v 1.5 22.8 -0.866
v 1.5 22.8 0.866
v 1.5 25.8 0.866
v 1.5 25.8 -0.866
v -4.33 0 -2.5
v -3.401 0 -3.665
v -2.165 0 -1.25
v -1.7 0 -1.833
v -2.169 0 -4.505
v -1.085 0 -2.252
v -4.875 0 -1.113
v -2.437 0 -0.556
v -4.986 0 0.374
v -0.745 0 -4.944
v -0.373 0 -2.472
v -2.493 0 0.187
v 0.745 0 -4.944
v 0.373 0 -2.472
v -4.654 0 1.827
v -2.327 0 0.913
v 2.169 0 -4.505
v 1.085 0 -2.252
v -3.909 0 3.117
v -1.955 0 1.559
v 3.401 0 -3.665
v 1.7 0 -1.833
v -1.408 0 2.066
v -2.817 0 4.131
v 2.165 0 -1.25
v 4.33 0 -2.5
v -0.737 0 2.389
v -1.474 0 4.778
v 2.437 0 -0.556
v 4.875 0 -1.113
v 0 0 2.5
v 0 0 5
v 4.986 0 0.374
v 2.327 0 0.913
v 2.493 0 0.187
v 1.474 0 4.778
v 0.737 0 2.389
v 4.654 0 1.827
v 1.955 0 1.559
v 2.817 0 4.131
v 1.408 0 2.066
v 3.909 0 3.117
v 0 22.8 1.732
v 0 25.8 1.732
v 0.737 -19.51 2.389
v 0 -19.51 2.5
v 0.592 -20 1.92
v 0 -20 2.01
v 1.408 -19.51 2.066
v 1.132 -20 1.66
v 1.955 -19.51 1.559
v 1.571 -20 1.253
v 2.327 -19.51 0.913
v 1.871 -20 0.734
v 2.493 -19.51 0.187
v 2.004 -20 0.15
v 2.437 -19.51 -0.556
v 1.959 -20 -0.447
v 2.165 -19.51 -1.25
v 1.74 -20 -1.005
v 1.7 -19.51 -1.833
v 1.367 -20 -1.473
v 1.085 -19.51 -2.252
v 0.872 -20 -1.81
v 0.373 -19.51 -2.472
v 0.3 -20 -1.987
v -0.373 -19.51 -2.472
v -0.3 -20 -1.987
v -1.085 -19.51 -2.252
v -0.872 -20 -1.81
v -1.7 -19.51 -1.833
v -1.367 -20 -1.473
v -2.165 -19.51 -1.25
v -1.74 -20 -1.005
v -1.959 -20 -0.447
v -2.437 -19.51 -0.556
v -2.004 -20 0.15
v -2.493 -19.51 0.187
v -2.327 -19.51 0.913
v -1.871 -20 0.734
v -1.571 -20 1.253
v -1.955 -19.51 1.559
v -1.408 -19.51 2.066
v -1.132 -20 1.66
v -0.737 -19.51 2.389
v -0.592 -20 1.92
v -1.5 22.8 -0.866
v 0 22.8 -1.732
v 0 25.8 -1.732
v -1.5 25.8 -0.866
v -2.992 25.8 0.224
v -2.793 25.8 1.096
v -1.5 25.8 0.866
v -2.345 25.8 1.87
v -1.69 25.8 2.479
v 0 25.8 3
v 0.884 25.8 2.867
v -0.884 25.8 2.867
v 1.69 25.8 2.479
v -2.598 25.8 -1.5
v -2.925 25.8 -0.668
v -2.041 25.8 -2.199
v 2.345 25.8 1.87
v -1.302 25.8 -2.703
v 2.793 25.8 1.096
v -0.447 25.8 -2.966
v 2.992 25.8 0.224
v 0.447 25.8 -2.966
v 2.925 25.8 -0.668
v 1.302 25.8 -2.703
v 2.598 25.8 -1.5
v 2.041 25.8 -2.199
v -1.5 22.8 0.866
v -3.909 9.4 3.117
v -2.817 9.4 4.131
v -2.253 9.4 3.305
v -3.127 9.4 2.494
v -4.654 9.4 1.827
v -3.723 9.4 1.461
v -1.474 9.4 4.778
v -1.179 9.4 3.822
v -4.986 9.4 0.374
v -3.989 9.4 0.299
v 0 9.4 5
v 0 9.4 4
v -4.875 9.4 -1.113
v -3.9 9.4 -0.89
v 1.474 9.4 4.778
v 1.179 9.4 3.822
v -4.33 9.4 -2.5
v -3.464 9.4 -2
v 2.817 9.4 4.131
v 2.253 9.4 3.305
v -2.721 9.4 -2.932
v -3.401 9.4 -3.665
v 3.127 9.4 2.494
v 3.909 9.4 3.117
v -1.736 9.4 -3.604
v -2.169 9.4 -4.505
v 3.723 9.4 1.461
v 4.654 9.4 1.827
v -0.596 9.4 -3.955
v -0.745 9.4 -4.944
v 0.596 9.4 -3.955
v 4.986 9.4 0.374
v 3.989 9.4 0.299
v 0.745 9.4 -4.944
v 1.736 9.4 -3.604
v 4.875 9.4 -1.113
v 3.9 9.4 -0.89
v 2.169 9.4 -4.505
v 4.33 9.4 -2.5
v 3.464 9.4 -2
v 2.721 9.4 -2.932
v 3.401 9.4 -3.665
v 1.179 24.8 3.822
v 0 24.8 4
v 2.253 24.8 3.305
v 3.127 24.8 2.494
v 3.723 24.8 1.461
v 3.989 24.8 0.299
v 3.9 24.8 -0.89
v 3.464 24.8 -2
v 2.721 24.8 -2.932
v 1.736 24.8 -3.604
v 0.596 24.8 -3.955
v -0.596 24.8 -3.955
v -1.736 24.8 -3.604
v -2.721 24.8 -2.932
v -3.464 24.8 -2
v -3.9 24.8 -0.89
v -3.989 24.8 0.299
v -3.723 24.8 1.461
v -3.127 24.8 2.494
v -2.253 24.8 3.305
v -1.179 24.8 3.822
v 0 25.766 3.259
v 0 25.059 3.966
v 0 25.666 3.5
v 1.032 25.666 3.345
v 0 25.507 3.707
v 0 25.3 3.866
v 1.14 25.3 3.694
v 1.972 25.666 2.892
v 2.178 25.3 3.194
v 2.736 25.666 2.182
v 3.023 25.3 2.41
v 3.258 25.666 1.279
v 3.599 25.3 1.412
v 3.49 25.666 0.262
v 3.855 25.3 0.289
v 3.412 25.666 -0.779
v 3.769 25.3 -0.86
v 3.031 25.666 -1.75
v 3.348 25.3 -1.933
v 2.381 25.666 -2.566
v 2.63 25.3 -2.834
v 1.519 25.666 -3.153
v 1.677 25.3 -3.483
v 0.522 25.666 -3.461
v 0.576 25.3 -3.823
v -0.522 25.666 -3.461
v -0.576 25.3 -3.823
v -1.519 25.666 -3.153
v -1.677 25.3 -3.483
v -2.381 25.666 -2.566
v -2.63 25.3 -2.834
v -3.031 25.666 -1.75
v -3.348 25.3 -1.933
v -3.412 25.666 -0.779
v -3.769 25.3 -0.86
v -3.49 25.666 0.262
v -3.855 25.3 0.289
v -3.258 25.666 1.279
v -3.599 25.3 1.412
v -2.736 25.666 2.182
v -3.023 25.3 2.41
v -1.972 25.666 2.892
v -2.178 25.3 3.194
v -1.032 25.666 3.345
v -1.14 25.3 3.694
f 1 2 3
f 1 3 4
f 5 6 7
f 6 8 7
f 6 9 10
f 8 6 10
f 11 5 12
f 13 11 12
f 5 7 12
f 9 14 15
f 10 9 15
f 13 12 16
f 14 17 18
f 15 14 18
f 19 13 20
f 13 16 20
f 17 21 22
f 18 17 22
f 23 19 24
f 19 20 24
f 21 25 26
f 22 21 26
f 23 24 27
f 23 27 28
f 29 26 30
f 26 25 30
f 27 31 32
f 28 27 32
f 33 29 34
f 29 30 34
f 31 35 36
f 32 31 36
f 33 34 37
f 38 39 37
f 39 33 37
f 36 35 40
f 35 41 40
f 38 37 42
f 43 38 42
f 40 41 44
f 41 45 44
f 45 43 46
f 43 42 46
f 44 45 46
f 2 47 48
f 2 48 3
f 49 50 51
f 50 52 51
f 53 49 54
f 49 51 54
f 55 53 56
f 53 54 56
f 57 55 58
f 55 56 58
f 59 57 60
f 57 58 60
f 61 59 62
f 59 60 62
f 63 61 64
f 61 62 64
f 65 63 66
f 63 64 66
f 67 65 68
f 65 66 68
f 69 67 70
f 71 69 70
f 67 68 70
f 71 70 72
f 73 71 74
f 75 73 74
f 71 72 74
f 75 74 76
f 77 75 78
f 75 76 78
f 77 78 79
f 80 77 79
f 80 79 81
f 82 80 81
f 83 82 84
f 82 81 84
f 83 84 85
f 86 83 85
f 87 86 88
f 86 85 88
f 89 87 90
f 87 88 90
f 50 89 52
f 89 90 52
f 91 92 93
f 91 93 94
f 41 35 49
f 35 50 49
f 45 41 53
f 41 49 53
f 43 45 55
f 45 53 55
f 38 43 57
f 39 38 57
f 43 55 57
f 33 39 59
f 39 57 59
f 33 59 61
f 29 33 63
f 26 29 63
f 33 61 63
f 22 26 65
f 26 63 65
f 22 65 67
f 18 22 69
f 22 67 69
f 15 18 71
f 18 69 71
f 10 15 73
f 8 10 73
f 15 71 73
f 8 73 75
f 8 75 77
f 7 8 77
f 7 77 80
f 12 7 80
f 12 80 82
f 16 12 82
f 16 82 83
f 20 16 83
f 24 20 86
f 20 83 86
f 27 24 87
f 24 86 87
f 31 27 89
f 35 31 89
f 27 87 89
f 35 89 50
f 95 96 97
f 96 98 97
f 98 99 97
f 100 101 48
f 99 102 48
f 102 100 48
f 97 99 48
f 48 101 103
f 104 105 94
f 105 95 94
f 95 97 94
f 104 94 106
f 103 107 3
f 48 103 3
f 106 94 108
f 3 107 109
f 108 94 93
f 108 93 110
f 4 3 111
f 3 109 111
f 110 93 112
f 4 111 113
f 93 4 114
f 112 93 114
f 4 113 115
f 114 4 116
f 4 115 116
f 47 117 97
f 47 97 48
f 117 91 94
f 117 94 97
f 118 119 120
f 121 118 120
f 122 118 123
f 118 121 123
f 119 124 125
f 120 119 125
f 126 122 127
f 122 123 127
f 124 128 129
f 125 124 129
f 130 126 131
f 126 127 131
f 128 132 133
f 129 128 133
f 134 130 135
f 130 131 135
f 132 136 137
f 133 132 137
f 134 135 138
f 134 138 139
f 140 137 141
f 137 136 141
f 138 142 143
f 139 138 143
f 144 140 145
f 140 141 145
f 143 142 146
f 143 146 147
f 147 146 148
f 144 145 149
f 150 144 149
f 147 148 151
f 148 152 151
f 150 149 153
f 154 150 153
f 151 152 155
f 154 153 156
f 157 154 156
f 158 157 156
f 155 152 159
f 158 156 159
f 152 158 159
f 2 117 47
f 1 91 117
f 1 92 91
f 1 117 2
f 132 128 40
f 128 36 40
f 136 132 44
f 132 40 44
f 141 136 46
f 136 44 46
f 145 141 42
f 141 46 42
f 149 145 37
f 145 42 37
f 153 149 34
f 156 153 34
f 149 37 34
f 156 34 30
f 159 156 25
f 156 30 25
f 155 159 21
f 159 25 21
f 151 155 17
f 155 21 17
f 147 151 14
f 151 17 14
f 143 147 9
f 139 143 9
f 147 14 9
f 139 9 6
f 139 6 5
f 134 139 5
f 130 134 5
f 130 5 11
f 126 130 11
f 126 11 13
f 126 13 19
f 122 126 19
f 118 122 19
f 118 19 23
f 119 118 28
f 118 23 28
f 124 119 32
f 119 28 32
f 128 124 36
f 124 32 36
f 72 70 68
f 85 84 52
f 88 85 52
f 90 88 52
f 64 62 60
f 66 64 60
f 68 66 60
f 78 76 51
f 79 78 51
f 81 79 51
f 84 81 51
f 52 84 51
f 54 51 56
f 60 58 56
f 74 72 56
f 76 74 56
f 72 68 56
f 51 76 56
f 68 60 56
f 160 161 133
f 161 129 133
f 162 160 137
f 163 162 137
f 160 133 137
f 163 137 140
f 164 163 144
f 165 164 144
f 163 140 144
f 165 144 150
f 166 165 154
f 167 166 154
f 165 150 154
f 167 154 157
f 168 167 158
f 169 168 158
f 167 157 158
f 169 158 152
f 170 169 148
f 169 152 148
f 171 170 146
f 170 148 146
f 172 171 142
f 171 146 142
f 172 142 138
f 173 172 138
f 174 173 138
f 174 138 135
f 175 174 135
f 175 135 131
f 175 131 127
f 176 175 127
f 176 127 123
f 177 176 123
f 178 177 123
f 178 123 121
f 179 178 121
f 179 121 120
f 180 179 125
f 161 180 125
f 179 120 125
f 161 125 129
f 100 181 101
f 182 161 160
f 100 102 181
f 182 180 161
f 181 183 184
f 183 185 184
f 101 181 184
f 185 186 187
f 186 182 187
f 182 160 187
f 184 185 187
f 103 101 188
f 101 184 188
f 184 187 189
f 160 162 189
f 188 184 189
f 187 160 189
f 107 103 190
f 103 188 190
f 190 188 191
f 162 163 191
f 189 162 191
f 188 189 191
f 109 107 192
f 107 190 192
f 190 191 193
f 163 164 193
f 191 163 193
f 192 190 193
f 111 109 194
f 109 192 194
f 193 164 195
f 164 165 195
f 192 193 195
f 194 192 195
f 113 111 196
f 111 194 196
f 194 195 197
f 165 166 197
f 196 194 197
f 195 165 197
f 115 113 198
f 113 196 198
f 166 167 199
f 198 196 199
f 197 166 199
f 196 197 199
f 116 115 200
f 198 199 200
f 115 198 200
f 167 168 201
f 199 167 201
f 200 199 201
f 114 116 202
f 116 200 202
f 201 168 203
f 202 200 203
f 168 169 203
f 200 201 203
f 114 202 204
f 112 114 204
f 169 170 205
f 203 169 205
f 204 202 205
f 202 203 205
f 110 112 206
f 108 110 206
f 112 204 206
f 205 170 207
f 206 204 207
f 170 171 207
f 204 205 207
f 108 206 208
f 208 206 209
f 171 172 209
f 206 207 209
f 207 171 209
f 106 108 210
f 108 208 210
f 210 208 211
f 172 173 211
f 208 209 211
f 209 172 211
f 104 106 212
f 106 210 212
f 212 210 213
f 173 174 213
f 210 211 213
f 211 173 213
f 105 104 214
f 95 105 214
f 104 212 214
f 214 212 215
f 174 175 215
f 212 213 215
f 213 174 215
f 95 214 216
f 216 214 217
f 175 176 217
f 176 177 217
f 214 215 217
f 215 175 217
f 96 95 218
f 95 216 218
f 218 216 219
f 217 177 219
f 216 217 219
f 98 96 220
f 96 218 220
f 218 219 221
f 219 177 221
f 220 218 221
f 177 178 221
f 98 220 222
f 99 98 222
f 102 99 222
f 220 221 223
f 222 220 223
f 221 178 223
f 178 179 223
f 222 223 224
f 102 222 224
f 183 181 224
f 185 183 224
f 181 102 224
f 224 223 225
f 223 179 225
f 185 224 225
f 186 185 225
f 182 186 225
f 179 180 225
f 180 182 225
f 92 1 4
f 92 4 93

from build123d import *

# Parameters (mm, degrees)
CUT_EXTRUDE_1_DEPTH      = 3
CUT_EXTRUDE_1_DEPTH_BACK = 3


with BuildPart() as part:
    # 草图1 → 旋转1 (revolve)
    with BuildSketch(Plane.XY):
        with BuildLine():
            Line((0, 25.8), (3, 25.8))
            ThreePointArc((3, 25.8), (3.707106781, 25.507106781), (4, 24.8))
            Line((4, 24.8), (4, 9.4))
            Line((4, 9.4), (5, 9.4))
            Line((5, 9.4), (5, 0))
            Line((5, 0), (2.5, 0))
            Line((2.5, 0), (2.5, -19.5095))
            Line((2.5, -19.5095), (2.0095, -20))
            Line((2.0095, -20), (0, -20))
            Line((0, -20), (0, 25.8))
        make_face()
    revolve(axis=Axis((0, -20, 0), (0, 1, 0)))

    # 草图2 → 切除-拉伸1 (cut, two sides: drawn at the far end of the back side and taken through both)
    with BuildSketch(Plane(origin=(0, 25.8, 0), x_dir=(1, 0, 0), z_dir=(0, 1, 0)).offset(-CUT_EXTRUDE_1_DEPTH_BACK)):
        Polygon((-1.5, 0.866025404), (-1.5, -0.866025404), (0, -1.732050808), (1.5, -0.866025404), (1.5, 0.866025404), (0, 1.732050808), align=None)
    extrude(amount=CUT_EXTRUDE_1_DEPTH + CUT_EXTRUDE_1_DEPTH_BACK, mode=Mode.SUBTRACT)


solid = part.part
